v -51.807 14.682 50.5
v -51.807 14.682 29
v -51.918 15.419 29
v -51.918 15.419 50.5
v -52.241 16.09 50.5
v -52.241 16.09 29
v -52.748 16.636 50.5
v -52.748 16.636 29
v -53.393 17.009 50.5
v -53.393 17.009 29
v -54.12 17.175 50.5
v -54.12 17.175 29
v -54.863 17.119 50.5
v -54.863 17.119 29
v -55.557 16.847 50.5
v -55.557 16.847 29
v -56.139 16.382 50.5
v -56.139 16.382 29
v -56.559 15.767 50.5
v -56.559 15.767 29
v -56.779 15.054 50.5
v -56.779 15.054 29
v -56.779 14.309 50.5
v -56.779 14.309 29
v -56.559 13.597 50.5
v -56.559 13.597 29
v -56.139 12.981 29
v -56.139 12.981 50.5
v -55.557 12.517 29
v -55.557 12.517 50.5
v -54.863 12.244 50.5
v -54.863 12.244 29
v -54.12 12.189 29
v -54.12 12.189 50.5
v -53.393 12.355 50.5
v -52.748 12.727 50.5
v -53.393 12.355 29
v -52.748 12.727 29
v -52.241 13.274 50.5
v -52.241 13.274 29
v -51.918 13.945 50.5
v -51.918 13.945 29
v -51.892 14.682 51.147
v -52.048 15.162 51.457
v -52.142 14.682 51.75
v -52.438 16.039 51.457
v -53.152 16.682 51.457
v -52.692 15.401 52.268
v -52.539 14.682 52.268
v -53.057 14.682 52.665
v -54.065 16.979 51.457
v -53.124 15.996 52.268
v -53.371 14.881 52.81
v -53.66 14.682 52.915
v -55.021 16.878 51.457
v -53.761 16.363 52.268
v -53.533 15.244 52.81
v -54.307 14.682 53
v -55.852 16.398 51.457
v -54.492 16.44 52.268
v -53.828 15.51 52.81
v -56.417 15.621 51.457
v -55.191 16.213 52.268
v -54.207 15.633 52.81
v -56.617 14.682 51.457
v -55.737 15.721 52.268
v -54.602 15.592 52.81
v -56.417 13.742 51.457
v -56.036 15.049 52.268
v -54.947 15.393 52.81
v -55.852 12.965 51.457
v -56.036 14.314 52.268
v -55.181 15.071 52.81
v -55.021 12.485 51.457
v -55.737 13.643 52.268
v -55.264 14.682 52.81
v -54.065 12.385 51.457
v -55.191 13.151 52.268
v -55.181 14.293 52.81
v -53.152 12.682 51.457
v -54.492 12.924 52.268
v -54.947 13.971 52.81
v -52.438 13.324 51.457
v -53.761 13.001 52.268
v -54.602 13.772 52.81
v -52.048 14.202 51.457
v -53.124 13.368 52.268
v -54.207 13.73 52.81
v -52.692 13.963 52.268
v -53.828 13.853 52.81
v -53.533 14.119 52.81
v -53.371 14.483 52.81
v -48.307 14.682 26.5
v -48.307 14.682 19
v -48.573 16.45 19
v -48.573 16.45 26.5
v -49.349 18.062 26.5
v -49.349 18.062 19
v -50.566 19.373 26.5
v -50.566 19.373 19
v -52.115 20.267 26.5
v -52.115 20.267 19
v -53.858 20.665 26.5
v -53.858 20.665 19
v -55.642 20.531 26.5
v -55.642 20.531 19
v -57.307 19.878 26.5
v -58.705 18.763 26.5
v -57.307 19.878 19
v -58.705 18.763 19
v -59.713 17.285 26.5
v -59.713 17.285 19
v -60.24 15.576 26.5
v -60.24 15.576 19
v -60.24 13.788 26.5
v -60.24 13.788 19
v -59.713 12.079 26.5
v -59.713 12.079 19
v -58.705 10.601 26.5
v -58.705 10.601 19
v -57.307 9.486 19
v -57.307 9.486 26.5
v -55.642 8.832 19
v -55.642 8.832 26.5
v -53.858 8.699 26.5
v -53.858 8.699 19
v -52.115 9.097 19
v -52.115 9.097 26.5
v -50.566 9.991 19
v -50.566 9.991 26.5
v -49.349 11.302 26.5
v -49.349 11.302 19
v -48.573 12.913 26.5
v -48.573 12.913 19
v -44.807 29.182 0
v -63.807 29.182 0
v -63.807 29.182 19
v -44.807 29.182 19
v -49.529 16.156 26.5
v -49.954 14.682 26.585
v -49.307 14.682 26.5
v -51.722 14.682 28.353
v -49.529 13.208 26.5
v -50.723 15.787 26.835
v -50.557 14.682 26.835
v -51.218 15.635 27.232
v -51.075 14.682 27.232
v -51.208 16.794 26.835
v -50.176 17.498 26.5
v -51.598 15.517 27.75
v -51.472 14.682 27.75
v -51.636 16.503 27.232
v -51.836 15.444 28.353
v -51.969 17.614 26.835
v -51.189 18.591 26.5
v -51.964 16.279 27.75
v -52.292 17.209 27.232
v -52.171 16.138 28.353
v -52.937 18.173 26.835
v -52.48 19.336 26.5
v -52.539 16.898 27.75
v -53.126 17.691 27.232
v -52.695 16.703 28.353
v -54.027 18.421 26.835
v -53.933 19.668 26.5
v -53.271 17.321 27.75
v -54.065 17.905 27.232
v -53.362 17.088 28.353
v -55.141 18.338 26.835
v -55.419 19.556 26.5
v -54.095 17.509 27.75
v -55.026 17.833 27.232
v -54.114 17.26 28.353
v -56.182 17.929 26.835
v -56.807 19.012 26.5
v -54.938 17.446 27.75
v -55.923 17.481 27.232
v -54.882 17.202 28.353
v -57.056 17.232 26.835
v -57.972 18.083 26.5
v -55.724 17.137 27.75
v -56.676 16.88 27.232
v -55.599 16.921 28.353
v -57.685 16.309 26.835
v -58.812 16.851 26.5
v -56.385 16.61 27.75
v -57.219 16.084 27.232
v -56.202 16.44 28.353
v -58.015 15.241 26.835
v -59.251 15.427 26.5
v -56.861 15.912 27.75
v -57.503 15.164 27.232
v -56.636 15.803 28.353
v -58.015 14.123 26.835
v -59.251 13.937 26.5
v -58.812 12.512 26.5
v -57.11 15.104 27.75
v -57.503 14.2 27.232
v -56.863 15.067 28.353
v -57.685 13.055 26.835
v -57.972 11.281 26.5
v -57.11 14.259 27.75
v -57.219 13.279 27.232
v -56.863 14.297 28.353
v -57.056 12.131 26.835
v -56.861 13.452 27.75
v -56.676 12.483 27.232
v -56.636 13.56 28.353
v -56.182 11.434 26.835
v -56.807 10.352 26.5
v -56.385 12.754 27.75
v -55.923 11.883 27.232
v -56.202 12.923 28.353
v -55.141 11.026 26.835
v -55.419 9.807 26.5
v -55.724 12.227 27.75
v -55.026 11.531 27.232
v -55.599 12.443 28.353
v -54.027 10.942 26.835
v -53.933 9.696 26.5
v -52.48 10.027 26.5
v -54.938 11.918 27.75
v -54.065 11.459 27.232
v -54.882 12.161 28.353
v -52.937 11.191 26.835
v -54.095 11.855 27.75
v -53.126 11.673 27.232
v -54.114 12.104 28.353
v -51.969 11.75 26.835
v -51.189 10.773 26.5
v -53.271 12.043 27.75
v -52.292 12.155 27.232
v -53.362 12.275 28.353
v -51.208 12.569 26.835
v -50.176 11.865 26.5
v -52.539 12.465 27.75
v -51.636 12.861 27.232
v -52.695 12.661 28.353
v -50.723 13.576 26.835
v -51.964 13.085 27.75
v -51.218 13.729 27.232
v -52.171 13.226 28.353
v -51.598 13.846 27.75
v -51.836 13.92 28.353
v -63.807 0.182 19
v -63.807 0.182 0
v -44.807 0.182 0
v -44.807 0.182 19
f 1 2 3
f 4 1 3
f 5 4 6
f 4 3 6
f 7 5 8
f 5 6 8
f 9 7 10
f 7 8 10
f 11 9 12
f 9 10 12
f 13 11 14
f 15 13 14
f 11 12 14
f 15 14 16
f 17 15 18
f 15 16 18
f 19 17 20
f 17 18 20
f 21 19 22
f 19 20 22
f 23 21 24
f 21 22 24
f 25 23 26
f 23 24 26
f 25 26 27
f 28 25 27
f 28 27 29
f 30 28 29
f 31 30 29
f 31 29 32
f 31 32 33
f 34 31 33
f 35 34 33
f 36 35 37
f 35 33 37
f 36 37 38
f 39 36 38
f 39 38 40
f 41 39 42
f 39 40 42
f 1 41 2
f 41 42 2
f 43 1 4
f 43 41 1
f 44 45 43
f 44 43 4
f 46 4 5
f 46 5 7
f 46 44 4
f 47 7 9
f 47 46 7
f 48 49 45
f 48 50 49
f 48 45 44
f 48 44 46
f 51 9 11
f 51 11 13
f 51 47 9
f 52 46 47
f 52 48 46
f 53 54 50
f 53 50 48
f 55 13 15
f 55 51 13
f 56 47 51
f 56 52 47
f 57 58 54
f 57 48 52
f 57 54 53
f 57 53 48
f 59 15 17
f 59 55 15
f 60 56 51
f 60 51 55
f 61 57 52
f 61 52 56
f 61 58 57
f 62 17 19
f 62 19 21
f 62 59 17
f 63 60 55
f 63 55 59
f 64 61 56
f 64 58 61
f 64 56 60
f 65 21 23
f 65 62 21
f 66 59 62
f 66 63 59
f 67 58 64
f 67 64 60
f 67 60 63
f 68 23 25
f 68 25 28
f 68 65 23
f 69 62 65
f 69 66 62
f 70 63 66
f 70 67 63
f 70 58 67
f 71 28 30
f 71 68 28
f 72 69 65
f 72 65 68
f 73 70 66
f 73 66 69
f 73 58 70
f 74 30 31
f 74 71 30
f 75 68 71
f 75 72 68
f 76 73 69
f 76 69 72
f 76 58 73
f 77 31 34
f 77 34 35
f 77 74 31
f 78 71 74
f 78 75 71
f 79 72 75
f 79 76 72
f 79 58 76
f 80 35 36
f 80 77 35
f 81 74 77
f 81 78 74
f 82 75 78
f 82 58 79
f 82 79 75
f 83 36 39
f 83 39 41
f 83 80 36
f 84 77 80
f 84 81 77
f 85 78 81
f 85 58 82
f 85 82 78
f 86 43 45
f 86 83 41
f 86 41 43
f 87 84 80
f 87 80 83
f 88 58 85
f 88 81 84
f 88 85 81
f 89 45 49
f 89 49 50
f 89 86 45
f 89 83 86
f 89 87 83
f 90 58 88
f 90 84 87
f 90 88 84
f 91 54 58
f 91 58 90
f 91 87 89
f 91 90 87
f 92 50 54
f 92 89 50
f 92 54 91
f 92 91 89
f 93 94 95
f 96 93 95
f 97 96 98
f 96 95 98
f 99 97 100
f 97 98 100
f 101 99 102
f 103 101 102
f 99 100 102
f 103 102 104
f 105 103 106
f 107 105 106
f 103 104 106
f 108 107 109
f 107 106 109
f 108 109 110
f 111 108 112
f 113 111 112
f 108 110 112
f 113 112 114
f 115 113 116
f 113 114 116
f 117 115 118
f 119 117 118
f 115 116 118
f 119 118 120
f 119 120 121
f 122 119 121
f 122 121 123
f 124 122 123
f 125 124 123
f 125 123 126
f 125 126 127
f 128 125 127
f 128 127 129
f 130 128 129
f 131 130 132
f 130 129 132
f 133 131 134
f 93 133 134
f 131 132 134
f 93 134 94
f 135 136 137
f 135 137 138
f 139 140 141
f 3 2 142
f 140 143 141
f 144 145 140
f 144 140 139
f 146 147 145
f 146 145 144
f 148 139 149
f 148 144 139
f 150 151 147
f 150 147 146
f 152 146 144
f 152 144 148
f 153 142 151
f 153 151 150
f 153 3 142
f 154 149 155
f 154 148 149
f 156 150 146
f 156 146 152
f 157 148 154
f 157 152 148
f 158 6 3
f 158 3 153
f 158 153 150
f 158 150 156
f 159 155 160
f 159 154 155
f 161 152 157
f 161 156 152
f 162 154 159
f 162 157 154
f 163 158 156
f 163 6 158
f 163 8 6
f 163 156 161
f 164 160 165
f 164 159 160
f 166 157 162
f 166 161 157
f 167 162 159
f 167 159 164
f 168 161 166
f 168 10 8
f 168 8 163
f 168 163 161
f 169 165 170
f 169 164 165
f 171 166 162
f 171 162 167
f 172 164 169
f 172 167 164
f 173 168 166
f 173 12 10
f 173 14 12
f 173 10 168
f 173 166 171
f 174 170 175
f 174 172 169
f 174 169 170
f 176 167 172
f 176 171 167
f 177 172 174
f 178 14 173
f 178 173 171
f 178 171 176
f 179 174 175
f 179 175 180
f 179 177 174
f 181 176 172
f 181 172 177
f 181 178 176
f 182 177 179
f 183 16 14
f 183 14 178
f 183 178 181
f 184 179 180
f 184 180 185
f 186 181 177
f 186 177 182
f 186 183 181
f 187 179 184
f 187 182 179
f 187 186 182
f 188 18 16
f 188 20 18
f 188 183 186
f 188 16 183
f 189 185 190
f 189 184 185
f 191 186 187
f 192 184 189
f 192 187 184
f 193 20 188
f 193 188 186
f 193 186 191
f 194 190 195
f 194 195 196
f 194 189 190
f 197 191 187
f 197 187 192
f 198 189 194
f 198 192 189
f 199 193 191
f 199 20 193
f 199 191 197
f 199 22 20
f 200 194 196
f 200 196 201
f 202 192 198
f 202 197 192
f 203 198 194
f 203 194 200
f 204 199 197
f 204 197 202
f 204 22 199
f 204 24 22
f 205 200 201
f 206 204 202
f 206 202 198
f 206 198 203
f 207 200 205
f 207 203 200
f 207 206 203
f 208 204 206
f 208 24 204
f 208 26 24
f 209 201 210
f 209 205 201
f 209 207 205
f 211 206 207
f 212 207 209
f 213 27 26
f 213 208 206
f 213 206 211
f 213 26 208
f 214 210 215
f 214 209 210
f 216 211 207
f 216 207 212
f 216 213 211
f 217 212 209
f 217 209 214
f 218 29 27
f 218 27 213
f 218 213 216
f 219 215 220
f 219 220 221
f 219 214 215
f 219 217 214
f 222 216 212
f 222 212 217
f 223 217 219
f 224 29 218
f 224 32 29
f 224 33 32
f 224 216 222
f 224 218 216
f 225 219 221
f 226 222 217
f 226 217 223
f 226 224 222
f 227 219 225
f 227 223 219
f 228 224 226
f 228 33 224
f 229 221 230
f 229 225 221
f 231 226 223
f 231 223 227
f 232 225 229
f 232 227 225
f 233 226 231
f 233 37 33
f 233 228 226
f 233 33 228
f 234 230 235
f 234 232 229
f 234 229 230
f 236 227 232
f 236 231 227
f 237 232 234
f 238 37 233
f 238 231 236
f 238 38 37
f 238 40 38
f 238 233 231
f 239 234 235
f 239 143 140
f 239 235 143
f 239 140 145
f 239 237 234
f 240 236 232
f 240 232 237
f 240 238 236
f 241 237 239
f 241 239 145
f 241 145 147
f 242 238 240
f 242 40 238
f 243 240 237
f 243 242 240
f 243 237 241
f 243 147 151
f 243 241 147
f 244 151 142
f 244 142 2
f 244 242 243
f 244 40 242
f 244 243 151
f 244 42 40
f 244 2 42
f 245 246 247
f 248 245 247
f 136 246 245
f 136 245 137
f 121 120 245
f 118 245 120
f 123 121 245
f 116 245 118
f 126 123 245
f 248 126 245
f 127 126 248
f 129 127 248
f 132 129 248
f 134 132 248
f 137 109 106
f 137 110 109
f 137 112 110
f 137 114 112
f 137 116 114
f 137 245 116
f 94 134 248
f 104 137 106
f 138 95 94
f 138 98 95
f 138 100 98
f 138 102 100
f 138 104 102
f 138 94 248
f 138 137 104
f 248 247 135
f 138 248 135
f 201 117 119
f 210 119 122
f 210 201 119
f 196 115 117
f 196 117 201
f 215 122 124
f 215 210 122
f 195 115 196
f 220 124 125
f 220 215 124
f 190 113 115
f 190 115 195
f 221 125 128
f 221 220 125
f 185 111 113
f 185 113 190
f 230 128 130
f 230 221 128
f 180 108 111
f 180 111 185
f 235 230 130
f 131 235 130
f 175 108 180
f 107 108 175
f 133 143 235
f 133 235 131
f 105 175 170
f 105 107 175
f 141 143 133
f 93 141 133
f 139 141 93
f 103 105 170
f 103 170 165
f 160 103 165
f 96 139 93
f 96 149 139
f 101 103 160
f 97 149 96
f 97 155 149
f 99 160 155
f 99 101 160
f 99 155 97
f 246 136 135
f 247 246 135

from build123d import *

# Parameters (mm, degrees)
ESQUISSE1_W        = 19
ESQUISSE1_H        = 29
BOSS_EXTRU_1_DEPTH = 19
ESQUISSE3_R        = 6
BOSS_EXTRU_2_DEPTH = 7.5
ESQUISSE4_R        = 2.5
BOSS_EXTRU_3_DEPTH = 26.5
CONG_3_R           = 2.5


with BuildPart() as part:
    # Esquisse1 → Boss.-Extru.1 (new body)
    with BuildSketch(Plane.XY):
        with Locations((-54.306805708, 14.681818182)):
            Rectangle(ESQUISSE1_W, ESQUISSE1_H)
    extrude(amount=BOSS_EXTRU_1_DEPTH)

    # Esquisse3 → Boss.-Extru.2 (add)
    with BuildSketch(Plane.XY.offset(19)):
        with Locations((-54.306805708, 14.681818182)):
            Circle(ESQUISSE3_R)
    extrude(amount=BOSS_EXTRU_2_DEPTH)

    # Esquisse4 → Boss.-Extru.3 (add)
    with BuildSketch(Plane.XY.offset(26.5)):
        with Locations((-54.306805708, 14.681818182)):
            Circle(ESQUISSE4_R)
    extrude(amount=BOSS_EXTRU_3_DEPTH)

    # Congé3
    cong_3_edges = [part.edges().sort_by_distance(p)[0] for p in [
        (-56.806805708, 14.681818182, 26.5),
        (-56.806805708, 14.681818182, 53),
    ]]
    fillet(cong_3_edges, radius=CONG_3_R)


solid = part.part
